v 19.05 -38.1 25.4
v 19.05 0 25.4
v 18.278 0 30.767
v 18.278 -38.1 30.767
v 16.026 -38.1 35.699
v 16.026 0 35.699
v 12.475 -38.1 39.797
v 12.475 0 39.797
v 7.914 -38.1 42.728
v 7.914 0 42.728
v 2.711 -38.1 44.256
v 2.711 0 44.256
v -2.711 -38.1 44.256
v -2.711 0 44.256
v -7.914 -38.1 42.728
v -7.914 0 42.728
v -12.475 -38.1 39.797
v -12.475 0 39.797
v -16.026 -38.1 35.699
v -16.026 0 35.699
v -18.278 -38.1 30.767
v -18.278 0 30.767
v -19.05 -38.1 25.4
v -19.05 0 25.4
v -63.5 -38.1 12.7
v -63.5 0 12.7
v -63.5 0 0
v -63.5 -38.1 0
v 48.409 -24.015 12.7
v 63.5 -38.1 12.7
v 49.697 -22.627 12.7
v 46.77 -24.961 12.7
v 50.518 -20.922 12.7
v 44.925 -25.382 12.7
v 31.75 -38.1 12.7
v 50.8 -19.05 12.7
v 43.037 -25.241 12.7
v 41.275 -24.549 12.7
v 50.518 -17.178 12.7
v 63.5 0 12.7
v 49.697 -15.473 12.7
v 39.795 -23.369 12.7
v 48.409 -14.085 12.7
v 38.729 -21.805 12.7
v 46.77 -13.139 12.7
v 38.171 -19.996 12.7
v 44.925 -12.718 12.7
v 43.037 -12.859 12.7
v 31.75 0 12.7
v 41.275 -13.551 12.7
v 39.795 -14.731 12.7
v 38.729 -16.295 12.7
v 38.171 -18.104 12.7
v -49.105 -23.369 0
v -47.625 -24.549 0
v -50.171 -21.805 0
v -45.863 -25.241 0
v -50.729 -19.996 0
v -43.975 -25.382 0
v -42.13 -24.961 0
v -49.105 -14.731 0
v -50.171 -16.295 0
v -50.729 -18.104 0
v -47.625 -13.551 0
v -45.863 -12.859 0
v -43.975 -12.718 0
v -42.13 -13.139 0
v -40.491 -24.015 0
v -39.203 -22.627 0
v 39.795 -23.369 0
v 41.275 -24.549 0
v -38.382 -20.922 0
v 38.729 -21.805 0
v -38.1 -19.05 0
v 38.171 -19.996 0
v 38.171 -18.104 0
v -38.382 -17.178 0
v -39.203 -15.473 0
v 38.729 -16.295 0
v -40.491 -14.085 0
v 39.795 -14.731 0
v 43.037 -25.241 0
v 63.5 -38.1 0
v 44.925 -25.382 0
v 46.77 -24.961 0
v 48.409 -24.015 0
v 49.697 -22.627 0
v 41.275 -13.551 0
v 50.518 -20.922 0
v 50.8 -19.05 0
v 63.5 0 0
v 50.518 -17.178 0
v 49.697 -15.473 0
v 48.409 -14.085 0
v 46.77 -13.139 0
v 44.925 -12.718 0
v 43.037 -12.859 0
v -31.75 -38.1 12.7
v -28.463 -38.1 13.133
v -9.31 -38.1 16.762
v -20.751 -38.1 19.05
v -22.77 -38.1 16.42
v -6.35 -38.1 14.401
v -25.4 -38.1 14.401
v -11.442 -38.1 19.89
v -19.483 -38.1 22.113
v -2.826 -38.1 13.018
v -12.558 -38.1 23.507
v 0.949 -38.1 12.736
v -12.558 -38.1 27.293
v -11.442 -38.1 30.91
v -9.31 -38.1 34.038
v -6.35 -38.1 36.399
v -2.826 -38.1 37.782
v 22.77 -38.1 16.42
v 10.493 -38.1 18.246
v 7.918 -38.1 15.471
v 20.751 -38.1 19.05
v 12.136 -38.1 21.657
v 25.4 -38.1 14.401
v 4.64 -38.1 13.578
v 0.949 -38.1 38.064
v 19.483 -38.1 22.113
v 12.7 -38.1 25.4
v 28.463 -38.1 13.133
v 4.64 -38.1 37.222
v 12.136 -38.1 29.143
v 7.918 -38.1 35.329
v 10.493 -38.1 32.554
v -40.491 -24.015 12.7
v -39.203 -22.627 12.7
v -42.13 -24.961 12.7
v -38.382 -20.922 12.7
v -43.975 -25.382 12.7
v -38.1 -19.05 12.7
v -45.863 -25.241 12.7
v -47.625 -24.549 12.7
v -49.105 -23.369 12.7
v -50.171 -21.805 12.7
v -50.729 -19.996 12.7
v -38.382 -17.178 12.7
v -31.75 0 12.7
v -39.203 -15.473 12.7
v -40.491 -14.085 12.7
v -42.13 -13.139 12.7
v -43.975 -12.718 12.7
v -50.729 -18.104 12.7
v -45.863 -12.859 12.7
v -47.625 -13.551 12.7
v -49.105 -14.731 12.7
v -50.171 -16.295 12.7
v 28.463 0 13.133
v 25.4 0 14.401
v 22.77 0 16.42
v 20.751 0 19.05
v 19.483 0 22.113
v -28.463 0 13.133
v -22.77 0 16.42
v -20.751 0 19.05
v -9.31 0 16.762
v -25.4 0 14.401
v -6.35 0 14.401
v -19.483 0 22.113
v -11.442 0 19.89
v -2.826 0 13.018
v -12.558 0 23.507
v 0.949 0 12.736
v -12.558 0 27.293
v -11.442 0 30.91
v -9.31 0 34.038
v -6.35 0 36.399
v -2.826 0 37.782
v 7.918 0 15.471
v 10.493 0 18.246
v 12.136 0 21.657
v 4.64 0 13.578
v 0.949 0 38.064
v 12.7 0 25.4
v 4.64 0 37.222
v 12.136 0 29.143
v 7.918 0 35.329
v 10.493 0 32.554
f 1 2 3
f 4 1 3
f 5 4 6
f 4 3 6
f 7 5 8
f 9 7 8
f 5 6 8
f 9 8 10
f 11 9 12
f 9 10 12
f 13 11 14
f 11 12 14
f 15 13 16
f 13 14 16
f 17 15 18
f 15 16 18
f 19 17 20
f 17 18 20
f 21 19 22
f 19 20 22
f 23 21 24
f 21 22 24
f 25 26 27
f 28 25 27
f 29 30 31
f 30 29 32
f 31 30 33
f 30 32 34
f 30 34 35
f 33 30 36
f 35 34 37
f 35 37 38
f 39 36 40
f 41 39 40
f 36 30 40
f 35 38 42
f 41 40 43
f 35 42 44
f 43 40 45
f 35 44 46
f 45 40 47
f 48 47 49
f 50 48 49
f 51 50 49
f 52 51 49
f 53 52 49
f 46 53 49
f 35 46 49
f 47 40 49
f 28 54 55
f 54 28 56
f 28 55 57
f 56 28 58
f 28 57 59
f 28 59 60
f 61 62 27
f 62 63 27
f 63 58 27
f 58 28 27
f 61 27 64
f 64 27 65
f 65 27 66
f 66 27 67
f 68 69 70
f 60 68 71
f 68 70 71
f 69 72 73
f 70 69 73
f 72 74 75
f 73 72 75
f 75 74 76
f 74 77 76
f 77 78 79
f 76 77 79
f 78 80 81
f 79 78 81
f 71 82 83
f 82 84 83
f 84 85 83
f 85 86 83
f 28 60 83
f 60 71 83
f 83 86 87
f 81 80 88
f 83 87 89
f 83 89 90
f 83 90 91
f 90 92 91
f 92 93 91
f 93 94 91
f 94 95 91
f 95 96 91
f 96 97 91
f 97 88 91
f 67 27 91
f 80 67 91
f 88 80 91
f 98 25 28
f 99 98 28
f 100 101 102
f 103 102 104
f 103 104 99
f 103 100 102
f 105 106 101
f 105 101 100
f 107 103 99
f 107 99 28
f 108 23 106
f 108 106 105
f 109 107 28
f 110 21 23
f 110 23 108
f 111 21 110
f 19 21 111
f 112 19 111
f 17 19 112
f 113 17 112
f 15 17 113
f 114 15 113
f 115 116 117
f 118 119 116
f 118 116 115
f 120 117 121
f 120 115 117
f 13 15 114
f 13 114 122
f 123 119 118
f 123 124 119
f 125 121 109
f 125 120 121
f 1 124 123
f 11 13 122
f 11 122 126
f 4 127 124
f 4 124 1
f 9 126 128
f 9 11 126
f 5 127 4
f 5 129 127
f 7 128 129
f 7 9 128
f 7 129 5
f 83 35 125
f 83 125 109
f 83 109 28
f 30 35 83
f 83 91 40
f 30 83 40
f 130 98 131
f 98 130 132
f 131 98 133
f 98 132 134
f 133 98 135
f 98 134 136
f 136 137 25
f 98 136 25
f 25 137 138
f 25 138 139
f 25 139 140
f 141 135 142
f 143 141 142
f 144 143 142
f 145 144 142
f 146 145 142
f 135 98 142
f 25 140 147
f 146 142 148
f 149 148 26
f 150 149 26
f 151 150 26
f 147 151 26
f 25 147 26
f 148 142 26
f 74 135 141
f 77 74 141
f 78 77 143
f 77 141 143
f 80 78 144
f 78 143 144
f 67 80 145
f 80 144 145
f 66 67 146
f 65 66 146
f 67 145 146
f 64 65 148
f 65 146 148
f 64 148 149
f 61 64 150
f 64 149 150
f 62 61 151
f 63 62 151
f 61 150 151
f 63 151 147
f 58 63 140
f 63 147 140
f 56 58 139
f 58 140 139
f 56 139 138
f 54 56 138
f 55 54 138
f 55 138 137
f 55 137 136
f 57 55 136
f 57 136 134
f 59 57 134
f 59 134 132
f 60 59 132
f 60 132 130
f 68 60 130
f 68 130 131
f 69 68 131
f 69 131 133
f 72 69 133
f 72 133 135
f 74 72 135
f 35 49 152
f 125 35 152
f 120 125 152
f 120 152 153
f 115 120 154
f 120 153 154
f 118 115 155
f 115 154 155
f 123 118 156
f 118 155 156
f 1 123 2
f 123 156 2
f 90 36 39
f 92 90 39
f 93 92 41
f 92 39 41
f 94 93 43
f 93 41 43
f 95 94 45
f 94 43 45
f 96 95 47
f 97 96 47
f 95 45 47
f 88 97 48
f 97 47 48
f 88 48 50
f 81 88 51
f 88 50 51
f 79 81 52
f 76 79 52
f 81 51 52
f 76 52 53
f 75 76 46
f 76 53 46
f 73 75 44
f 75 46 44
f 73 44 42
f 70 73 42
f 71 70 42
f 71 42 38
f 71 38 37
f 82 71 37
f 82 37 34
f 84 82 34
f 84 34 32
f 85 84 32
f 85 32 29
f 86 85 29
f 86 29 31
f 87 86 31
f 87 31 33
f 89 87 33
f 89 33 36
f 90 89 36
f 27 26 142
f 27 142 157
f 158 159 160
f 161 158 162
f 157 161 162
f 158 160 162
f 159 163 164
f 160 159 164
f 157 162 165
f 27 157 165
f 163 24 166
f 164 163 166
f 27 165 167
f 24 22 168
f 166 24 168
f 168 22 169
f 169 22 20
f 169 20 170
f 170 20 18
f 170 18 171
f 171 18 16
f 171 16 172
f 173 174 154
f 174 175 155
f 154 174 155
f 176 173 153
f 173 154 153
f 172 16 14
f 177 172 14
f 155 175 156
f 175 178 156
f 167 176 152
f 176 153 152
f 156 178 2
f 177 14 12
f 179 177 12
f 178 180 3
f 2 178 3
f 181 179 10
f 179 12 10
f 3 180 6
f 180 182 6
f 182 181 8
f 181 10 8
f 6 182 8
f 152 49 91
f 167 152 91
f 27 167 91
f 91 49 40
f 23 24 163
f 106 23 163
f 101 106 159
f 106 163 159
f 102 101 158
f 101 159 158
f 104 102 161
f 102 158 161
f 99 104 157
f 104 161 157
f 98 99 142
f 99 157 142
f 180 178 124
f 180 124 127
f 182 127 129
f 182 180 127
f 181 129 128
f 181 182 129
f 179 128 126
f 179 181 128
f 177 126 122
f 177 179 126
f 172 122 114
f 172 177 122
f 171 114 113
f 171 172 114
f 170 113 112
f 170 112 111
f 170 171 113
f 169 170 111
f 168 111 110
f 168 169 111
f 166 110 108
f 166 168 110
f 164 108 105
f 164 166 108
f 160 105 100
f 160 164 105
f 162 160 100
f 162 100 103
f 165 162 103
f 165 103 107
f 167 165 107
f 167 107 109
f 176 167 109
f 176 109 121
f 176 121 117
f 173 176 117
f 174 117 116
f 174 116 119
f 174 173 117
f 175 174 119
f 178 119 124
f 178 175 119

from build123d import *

# Parameters (mm, degrees)
F0_R     = 12.7
F1_DEPTH = 38.1
F2_R     = 6.35
F3_DEPTH = 25.4
F4_R     = 6.35
F5_DEPTH = 25.4


with BuildPart() as f1:
    # F0 (on Front) → F1 (new body)
    with BuildSketch(Plane.XZ):
        with BuildLine():
            Line((-63.5, 0), (0, 0))
            Line((0, 0), (63.5, 0))
            Line((63.5, 0), (63.5, 12.7))
            Line((63.5, 12.7), (31.75, 12.7))
            ThreePointArc((31.75, 12.7), (22.769744, 16.419744), (19.05, 25.4))
            ThreePointArc((19.05, 25.4), (0, 44.45), (-19.05, 25.4))
            ThreePointArc((-19.05, 25.4), (-22.769744, 16.419744), (-31.75, 12.7))
            Line((-31.75, 12.7), (-63.5, 12.7))
            Line((-63.5, 12.7), (-63.5, 0))
        make_face()
        with Locations((0, 25.4)):
            Circle(F0_R, mode=Mode.SUBTRACT)
    extrude(amount=F1_DEPTH)

    # F2 (on face) → F3 (cut)
    with BuildSketch(Plane.XY.offset(12.7)):
        with Locations((44.45, -19.05)):
            Circle(F2_R)
    extrude(amount=-F3_DEPTH, mode=Mode.SUBTRACT)

    # F4 (on face) → F5 (cut)
    with BuildSketch(Plane.XY.offset(12.7)):
        with Locations((-44.45, -19.05)):
            Circle(F4_R)
    extrude(amount=-F5_DEPTH, mode=Mode.SUBTRACT)


solid = f1.part
